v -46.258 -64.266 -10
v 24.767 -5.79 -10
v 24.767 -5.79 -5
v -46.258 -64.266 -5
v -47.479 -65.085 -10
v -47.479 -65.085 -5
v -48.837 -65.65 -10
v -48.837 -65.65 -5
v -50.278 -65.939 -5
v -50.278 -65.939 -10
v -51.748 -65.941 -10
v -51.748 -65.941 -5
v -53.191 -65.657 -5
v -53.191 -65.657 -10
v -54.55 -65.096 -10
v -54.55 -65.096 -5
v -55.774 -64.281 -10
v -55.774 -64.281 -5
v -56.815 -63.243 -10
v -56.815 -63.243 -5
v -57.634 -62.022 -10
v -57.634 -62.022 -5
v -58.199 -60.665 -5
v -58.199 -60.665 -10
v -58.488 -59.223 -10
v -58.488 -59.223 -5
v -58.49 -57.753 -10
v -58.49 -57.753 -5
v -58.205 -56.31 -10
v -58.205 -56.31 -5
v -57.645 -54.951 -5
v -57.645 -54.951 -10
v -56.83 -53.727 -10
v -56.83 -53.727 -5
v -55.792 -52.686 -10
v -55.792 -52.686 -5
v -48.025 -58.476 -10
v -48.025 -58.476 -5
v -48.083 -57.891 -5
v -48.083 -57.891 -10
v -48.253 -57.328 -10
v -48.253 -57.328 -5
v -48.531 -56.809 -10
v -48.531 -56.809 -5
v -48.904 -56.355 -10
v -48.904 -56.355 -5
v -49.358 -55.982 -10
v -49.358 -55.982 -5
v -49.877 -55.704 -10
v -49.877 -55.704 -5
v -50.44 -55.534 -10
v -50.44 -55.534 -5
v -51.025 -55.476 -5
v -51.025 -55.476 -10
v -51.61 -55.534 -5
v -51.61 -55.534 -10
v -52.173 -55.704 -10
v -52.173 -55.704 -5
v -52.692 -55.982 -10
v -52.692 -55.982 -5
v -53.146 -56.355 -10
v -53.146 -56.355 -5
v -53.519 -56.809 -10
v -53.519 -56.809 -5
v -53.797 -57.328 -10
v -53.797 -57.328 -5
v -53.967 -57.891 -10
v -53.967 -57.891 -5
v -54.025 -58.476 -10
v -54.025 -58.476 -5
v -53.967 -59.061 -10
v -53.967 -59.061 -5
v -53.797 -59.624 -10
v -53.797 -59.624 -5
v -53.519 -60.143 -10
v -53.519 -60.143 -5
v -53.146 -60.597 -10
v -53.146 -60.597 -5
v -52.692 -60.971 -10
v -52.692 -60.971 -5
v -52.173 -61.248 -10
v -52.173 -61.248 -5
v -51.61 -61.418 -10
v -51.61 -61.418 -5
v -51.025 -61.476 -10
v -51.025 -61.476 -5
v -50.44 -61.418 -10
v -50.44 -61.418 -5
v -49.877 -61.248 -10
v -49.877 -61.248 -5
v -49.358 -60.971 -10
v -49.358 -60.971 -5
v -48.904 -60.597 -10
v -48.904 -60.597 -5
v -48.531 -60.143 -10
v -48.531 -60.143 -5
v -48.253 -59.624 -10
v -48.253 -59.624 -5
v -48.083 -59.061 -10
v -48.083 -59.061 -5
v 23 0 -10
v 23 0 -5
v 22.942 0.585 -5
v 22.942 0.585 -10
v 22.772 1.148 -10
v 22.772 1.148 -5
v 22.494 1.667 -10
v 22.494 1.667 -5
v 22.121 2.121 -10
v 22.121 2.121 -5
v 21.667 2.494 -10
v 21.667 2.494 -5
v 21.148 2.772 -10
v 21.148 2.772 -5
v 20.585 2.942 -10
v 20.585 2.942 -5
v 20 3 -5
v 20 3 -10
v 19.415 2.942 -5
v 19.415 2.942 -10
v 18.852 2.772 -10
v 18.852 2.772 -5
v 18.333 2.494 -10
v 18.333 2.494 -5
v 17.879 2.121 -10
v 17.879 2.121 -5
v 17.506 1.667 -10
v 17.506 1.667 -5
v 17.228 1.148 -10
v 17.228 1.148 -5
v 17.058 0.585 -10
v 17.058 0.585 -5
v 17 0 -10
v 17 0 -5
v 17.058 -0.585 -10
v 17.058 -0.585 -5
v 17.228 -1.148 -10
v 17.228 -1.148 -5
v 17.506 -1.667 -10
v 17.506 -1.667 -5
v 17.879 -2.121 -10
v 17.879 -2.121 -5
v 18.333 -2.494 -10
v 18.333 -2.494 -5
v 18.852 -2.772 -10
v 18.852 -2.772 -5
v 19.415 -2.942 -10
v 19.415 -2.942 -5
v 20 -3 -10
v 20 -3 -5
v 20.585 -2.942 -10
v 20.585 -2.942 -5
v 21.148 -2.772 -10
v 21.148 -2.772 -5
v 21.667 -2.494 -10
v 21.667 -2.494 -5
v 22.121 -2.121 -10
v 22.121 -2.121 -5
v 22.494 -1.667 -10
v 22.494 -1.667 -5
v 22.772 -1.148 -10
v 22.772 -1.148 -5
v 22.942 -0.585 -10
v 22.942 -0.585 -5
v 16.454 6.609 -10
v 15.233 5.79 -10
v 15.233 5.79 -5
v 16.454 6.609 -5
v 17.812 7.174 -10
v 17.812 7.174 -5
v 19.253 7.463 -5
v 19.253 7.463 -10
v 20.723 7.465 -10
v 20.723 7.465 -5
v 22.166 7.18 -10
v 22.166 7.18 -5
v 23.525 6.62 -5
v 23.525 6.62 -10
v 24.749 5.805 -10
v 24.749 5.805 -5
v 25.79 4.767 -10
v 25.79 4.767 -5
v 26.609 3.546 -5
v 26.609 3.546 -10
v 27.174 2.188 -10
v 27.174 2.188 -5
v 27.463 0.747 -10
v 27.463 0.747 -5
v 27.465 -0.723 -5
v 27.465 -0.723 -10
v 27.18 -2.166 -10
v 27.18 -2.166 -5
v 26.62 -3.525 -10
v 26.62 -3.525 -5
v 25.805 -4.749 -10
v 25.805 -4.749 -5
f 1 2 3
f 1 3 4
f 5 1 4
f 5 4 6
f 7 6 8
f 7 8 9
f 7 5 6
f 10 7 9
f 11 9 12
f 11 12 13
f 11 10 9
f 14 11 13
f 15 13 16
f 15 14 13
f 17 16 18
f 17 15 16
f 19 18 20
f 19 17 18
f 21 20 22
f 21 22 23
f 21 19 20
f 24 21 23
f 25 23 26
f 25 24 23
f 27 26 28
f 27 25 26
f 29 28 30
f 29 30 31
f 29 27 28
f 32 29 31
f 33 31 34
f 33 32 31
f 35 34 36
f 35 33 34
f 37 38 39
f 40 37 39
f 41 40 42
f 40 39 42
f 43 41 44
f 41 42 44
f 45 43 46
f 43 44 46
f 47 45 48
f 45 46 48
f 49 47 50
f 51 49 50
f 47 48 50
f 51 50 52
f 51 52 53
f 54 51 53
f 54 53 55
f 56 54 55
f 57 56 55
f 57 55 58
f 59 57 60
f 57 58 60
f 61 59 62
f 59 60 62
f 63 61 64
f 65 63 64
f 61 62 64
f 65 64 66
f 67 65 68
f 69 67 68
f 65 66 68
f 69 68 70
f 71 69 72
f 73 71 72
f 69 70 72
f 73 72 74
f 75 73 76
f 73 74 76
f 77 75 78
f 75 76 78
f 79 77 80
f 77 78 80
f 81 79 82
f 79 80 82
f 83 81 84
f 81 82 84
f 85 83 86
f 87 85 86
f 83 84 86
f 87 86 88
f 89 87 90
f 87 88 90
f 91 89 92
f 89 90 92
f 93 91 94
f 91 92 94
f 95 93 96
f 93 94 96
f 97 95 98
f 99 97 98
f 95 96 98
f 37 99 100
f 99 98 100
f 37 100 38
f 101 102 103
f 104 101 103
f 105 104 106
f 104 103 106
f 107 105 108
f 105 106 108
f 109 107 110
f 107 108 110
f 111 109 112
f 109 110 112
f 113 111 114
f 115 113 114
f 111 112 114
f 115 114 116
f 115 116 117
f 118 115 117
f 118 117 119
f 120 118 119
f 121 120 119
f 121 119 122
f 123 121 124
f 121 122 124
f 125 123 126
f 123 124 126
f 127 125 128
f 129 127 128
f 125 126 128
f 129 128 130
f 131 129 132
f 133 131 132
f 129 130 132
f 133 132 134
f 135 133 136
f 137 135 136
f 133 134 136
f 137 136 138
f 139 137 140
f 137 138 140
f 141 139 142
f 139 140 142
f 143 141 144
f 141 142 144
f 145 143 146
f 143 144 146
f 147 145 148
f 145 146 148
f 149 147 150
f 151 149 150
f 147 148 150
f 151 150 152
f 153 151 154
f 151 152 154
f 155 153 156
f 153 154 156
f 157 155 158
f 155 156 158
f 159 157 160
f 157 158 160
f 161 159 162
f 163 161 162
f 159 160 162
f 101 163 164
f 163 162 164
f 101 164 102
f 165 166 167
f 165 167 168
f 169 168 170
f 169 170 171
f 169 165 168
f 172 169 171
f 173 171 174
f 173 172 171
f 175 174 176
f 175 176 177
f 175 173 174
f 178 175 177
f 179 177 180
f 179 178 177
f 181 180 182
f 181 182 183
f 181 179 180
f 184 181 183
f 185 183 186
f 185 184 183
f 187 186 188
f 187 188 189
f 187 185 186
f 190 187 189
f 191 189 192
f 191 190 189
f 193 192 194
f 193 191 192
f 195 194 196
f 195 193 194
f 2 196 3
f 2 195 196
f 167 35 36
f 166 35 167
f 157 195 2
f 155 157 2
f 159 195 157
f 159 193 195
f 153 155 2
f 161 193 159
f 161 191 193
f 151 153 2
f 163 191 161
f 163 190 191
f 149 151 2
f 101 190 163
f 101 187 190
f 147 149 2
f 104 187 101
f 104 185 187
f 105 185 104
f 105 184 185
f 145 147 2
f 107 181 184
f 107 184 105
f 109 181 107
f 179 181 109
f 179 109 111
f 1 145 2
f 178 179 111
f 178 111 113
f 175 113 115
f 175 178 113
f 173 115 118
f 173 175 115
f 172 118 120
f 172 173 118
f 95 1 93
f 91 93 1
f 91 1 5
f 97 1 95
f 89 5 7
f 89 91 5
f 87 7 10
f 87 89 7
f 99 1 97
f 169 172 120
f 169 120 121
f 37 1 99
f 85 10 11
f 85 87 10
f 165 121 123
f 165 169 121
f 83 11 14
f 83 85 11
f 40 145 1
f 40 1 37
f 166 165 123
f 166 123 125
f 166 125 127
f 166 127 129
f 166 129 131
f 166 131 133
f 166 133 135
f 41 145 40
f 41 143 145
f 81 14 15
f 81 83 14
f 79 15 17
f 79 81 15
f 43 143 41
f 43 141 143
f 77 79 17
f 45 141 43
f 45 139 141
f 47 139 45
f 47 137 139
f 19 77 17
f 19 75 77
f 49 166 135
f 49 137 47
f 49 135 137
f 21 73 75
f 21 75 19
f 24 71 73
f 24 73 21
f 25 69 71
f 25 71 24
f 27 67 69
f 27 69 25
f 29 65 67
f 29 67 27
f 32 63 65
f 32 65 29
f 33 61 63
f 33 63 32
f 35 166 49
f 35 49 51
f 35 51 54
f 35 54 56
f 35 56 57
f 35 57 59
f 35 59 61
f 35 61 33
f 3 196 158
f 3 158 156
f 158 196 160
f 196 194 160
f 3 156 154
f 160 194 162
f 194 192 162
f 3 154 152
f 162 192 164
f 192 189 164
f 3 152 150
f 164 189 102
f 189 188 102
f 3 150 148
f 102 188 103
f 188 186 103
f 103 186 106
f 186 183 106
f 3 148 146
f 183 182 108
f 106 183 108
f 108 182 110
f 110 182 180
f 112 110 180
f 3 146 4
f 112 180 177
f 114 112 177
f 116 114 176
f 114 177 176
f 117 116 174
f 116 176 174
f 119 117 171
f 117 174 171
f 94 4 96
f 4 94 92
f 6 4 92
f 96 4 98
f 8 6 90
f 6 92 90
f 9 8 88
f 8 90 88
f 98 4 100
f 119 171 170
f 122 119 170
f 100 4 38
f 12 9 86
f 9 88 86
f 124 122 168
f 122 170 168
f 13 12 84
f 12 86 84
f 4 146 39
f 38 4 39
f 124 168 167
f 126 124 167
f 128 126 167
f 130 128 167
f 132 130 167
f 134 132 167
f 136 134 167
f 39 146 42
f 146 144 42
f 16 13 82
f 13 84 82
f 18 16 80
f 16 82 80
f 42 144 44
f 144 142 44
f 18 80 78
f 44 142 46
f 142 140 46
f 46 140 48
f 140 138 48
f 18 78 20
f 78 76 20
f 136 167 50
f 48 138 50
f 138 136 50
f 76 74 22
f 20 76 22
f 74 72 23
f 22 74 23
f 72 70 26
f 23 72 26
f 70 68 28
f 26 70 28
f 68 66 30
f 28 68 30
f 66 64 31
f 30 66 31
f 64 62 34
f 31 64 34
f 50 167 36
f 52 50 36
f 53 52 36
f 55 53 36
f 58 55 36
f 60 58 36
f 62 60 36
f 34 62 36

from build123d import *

# Parameters (mm, degrees)
BOSS_EXTRU_1_START      = -10
BOSS_EXTRU_1_DEPTH      = 5
ESQUISSE2_R             = 3
ENL_V_MAT_EXTRU_1_DEPTH = 5


with BuildPart() as part:
    # Esquisse1 → Boss.-Extru.1 (new body)
    with BuildSketch(Plane.XY.offset(BOSS_EXTRU_1_START)):
        with BuildLine():
            Line((24.767075252, -5.790077162), (-46.257871267, -64.266200254))
            ThreePointArc((-46.257871267, -64.266200254), (-56.815023681, -63.243198344), (-55.792021772, -52.68604593))
            Line((-55.792021772, -52.68604593), (15.232924748, 5.790077162))
            ThreePointArc((15.232924748, 5.790077162), (25.790077162, 4.767075252), (24.767075252, -5.790077162))
        make_face()
    extrude(amount=BOSS_EXTRU_1_DEPTH)

    # Esquisse2 → Enlèv. mat.-Extru.1 (cut)
    with BuildSketch(Plane.XY.offset(-5)):
        with Locations((20, 0)):
            Circle(ESQUISSE2_R)
        with Locations((-51.024946519, -58.476123092)):
            Circle(ESQUISSE2_R)
    extrude(amount=-ENL_V_MAT_EXTRU_1_DEPTH, mode=Mode.SUBTRACT)


solid = part.part
